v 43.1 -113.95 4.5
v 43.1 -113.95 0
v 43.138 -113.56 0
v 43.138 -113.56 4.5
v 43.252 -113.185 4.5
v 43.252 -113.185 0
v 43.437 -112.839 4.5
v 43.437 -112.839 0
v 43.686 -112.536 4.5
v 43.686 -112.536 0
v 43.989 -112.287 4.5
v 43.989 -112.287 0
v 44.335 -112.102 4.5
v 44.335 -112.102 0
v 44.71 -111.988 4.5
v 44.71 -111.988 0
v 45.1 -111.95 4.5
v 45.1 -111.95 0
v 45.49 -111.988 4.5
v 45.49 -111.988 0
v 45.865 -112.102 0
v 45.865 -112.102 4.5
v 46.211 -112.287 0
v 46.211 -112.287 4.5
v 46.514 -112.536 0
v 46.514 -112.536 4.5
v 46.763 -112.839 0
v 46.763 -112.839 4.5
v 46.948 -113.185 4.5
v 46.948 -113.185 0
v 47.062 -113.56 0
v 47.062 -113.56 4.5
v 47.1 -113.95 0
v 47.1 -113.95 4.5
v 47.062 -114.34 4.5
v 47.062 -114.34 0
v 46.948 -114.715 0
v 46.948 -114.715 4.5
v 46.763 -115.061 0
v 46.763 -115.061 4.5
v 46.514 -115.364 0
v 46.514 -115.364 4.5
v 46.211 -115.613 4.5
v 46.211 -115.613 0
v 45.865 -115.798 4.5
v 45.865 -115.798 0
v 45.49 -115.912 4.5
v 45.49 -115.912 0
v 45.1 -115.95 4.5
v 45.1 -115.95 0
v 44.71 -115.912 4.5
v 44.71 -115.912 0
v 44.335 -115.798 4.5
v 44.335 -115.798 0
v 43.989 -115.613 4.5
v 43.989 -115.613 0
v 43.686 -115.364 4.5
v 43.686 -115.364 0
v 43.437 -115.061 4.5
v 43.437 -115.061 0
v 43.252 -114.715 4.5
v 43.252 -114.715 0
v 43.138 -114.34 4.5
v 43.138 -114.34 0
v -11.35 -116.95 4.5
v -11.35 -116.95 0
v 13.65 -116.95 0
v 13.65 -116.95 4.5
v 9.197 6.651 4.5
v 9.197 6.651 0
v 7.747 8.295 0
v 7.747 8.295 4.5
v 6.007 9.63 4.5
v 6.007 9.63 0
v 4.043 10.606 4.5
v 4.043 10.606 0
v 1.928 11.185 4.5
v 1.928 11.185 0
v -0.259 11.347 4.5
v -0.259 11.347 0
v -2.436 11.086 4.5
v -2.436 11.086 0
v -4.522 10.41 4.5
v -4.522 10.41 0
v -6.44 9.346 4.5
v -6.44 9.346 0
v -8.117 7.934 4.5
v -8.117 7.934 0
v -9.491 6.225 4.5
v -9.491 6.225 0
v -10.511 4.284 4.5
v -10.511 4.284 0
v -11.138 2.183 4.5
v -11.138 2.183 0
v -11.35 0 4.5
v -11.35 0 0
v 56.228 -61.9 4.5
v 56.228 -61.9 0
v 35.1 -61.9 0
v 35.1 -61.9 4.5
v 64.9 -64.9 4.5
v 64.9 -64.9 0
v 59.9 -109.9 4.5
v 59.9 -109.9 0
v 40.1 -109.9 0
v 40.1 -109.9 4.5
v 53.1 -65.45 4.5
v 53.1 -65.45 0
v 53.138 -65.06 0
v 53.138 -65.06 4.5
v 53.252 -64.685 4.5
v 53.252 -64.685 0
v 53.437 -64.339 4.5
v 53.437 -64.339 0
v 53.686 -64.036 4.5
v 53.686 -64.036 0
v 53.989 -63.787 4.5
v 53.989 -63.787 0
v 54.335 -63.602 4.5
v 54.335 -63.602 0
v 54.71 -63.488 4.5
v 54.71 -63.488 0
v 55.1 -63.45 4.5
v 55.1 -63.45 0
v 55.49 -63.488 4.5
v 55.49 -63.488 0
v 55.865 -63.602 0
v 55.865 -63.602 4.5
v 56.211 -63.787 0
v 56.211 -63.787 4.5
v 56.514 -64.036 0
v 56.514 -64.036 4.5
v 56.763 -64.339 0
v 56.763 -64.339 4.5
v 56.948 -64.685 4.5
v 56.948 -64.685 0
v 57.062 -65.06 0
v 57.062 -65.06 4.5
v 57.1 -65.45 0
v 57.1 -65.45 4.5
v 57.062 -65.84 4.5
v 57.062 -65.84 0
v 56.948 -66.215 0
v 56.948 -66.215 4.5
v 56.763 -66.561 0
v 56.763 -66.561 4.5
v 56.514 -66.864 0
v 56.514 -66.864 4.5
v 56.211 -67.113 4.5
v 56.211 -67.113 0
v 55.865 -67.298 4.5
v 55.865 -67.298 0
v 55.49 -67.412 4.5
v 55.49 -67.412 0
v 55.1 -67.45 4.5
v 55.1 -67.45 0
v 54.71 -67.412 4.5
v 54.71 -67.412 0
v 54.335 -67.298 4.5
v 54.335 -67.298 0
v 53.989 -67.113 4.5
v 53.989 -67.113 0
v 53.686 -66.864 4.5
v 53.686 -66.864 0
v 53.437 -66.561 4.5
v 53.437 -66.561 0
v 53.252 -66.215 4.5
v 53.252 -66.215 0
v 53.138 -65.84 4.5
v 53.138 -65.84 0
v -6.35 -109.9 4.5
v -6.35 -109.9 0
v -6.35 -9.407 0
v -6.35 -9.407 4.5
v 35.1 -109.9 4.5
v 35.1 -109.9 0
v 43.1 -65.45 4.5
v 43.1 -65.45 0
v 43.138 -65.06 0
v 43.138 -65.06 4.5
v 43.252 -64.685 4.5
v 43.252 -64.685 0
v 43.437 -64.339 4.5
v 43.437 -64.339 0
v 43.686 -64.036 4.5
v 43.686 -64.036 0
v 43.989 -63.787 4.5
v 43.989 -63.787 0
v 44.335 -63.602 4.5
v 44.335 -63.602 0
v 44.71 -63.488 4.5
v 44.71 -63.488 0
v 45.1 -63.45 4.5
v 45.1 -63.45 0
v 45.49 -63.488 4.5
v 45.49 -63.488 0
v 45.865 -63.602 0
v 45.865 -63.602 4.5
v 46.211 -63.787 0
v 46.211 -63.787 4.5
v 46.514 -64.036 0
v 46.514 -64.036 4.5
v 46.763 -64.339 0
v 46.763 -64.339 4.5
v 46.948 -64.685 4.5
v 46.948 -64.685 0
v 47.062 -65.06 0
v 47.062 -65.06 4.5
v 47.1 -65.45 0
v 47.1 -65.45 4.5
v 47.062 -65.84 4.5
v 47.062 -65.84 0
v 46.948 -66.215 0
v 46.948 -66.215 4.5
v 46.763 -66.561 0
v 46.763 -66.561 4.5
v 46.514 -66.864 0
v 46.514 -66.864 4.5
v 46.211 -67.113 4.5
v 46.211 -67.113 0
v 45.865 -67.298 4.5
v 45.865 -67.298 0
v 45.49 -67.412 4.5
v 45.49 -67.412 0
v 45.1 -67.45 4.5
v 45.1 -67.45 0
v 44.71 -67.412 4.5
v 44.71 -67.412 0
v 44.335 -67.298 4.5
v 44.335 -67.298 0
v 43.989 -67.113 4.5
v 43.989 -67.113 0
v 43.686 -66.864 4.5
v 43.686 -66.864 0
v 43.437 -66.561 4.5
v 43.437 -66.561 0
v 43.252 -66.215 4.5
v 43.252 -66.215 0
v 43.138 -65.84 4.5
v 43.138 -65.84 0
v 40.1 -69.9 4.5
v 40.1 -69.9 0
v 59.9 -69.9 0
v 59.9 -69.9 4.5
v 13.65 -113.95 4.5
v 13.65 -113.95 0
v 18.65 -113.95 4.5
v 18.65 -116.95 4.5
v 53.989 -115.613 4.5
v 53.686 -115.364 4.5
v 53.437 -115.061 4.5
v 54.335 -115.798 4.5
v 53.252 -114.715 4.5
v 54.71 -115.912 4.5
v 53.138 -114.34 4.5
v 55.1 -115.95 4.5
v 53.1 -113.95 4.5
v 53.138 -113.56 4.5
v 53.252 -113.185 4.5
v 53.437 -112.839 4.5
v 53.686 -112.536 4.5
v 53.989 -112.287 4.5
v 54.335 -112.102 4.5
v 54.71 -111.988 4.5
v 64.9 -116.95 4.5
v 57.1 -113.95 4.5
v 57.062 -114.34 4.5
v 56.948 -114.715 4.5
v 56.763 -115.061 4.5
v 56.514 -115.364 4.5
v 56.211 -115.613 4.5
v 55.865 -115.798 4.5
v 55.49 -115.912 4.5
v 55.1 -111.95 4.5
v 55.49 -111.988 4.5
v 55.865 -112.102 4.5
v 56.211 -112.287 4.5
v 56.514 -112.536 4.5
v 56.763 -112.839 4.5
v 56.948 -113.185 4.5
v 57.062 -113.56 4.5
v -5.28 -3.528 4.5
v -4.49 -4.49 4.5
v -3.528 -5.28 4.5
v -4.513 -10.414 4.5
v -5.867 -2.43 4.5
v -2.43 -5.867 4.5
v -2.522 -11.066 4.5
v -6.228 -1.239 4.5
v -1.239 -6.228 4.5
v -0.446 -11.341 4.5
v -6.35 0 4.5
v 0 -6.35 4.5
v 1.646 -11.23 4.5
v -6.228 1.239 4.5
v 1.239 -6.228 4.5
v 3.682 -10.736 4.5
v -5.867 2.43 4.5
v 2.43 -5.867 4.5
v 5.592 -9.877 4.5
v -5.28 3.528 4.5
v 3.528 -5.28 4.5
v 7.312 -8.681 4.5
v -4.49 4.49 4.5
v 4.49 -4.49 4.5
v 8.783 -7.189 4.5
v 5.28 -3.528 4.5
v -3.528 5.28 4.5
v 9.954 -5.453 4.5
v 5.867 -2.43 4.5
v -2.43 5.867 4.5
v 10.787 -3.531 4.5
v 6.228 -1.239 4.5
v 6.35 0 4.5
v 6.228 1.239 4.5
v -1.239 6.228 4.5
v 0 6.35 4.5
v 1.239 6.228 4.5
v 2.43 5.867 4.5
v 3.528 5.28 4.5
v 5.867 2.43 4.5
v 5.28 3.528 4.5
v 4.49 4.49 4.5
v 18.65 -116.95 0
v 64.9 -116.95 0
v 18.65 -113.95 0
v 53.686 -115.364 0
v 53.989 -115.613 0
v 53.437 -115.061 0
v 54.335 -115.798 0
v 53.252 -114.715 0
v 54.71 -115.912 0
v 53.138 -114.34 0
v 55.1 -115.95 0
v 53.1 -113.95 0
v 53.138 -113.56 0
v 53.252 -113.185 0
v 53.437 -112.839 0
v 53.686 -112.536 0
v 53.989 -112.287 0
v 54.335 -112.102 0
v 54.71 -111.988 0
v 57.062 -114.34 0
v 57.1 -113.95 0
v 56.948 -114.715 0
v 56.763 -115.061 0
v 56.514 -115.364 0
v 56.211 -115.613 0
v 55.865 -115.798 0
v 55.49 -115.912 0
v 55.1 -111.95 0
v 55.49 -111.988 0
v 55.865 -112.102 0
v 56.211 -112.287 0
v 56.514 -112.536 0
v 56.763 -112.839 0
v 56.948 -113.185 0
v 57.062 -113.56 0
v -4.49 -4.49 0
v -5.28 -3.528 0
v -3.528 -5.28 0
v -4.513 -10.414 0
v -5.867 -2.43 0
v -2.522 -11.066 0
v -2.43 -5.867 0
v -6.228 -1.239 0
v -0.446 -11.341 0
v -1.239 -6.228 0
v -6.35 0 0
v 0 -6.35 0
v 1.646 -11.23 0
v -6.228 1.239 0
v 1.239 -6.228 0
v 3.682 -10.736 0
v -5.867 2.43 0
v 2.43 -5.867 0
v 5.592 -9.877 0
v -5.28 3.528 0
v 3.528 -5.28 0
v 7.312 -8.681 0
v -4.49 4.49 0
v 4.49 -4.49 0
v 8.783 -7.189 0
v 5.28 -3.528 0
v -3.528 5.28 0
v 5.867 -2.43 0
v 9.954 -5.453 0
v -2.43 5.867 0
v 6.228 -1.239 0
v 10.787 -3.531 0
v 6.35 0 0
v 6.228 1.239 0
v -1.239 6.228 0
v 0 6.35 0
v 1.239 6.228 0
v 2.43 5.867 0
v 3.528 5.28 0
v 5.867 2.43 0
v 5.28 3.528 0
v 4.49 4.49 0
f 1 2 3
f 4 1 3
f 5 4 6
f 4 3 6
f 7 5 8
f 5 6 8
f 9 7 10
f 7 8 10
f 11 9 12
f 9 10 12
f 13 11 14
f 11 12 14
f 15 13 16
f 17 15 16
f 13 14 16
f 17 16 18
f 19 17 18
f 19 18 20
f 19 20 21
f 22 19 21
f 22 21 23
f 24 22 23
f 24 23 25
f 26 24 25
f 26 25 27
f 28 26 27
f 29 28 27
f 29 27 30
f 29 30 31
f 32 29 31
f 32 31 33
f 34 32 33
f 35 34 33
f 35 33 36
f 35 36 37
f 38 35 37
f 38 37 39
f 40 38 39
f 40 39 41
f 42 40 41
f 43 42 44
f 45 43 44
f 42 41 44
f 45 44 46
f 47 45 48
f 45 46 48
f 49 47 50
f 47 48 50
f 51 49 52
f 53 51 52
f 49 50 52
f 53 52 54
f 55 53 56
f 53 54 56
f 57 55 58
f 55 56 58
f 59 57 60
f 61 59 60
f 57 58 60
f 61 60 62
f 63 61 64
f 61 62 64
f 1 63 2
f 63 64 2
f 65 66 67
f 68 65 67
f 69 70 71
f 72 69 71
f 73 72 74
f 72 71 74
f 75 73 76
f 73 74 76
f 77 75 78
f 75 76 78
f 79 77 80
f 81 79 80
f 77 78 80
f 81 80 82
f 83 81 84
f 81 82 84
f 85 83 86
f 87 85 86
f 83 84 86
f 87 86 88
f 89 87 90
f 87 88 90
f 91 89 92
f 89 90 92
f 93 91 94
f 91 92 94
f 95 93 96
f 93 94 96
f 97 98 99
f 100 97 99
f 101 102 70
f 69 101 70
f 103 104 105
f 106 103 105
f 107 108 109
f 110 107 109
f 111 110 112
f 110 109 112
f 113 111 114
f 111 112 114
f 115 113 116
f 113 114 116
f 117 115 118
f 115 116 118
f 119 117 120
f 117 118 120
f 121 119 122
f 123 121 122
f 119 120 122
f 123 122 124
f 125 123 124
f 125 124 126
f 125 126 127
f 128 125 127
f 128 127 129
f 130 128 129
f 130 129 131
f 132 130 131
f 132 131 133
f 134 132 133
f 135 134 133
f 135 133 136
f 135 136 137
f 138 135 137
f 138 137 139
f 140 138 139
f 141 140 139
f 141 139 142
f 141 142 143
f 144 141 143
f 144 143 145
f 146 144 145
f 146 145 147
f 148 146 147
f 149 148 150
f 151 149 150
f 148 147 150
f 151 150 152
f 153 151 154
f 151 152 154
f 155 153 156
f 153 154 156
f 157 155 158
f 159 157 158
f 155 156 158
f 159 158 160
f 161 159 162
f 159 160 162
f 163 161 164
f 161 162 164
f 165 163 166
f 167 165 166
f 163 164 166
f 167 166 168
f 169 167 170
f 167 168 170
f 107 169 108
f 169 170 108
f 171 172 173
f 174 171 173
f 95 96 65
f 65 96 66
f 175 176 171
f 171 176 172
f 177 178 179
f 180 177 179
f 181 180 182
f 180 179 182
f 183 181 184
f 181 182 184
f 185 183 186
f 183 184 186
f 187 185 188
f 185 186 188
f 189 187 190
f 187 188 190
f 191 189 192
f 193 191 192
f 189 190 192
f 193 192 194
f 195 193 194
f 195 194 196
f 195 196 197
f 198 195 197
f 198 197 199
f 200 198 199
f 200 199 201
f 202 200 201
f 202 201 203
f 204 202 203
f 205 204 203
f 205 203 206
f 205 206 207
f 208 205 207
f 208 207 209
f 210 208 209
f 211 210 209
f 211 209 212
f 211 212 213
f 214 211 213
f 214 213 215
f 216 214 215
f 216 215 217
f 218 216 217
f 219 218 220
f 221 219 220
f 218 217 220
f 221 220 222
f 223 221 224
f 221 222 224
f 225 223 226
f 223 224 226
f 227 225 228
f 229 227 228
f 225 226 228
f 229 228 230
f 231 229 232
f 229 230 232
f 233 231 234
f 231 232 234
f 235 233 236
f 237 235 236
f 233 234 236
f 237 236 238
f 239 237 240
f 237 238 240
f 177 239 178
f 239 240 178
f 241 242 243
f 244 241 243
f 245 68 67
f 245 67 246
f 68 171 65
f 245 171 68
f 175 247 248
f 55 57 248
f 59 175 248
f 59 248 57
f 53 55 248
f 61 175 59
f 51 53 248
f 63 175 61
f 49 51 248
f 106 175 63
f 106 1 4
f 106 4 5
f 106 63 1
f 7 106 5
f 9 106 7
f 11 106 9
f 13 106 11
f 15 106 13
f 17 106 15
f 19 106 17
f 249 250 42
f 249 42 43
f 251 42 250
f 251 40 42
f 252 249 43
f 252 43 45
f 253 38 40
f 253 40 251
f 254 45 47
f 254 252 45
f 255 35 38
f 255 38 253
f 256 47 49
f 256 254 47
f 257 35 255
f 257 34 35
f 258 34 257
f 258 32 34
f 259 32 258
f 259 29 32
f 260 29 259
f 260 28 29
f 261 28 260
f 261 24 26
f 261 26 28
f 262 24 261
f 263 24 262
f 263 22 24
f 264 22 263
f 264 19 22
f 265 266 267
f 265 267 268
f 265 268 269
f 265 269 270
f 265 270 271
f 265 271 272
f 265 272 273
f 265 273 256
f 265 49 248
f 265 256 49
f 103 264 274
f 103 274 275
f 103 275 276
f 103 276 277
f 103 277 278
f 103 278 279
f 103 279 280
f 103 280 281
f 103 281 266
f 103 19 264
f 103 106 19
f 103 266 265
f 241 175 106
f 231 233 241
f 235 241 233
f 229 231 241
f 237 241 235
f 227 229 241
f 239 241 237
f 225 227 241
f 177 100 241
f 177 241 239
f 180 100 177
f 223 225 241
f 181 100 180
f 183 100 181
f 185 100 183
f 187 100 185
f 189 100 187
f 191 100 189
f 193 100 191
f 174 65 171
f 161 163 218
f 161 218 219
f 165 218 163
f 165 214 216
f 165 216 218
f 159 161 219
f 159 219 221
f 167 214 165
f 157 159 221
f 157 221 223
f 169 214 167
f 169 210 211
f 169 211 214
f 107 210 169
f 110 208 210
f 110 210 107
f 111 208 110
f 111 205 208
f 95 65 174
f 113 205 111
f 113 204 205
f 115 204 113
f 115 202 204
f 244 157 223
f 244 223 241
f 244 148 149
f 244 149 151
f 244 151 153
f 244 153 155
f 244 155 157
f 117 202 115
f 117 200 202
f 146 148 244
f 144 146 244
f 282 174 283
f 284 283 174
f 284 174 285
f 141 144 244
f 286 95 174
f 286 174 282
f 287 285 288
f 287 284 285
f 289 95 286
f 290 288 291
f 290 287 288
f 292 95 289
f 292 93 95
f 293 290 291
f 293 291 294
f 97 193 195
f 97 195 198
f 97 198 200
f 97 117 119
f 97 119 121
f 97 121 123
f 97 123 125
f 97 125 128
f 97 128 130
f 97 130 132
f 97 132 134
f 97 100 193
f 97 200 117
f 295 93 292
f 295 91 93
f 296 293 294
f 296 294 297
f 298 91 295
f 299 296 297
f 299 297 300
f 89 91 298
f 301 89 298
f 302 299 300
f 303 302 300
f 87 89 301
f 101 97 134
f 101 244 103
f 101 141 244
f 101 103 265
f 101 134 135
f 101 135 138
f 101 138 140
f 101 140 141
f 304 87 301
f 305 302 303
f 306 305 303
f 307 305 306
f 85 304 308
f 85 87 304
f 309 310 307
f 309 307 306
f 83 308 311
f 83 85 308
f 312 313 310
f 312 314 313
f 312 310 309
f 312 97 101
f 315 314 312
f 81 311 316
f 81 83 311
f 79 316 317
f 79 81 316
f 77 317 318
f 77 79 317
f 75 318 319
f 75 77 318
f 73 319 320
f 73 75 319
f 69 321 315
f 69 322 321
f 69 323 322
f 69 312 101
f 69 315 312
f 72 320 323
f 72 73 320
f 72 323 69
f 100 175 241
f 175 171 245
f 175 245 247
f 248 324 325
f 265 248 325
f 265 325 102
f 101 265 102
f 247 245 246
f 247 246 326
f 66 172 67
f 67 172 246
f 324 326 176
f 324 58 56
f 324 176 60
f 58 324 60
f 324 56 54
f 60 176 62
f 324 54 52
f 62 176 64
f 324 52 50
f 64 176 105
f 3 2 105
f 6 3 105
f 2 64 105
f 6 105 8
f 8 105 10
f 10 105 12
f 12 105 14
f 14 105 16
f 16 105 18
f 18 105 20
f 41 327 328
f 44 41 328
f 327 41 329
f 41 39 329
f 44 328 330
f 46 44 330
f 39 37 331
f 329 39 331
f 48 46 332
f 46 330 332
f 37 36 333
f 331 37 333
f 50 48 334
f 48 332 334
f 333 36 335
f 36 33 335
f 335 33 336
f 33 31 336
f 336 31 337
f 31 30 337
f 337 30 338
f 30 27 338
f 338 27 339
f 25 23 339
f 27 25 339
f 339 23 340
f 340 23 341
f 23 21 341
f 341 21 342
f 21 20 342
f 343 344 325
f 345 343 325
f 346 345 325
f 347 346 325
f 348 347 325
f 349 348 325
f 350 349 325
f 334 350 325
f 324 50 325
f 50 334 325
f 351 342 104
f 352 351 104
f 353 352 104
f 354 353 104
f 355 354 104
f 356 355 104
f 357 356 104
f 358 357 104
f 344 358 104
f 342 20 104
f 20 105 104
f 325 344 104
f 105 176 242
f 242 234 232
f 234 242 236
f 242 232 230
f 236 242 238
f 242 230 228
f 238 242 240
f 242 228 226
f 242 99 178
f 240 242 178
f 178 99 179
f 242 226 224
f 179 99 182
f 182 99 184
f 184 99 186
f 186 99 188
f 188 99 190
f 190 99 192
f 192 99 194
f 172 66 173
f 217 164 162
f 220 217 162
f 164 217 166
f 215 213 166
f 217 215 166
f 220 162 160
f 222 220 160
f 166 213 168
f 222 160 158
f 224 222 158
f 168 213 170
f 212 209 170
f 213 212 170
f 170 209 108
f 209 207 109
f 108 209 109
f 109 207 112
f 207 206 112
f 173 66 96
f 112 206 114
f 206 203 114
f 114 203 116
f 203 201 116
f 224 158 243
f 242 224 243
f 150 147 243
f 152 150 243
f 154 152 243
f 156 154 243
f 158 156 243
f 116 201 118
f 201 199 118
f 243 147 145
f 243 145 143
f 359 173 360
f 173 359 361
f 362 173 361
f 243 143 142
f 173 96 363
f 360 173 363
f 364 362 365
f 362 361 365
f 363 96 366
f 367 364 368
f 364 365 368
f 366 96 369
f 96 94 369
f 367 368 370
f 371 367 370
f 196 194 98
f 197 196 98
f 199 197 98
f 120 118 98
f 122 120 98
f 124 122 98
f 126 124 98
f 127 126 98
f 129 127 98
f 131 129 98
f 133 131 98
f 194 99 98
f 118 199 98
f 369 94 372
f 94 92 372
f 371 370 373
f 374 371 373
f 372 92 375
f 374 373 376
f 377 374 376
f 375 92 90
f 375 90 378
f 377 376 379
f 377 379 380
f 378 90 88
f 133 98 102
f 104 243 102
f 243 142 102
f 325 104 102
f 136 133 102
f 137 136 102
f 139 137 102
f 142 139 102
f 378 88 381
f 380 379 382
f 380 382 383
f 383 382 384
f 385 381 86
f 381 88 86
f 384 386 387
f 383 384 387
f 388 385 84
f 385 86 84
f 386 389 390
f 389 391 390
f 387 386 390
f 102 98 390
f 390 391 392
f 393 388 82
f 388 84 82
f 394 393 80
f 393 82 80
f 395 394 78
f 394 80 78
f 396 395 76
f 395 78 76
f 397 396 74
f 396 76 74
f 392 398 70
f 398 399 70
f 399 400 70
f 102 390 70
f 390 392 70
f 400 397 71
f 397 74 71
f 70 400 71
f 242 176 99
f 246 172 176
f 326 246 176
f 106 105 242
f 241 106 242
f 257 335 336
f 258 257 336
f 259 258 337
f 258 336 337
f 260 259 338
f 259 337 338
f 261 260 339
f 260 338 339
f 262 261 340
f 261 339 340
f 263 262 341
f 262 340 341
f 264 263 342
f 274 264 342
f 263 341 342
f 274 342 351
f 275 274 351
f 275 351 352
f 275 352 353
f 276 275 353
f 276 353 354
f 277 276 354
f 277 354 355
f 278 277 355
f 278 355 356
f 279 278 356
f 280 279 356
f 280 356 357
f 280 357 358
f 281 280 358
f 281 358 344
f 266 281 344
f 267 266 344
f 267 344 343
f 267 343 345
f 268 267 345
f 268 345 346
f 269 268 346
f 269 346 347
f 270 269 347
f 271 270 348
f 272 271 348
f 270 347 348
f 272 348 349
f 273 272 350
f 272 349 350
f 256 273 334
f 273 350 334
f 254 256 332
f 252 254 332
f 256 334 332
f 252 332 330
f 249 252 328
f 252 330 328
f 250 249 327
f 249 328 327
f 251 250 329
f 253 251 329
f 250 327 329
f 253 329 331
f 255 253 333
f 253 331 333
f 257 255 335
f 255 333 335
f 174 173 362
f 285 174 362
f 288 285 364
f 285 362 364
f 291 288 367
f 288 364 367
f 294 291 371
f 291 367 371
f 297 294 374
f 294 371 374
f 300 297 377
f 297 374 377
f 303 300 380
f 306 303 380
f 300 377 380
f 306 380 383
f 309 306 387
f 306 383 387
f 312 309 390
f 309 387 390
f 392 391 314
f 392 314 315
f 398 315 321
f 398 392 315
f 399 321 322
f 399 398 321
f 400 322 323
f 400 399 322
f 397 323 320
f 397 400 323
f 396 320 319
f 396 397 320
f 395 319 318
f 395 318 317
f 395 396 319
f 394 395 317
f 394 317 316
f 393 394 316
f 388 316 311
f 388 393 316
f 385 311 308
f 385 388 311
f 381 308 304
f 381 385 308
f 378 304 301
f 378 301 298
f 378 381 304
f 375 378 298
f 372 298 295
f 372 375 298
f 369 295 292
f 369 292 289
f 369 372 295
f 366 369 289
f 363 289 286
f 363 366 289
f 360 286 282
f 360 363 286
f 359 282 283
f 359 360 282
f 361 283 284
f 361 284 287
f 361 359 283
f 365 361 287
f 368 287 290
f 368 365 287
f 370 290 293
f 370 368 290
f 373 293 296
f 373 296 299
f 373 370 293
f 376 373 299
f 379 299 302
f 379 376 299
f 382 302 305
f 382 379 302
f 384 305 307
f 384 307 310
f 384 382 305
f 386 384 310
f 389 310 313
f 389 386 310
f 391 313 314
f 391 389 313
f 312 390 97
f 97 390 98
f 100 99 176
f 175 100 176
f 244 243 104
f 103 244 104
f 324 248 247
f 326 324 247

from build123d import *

# Parameters (mm, degrees)
SKETCH1_R           = 6.35
BOSS_EXTRUDE1_DEPTH = 4.5
SKETCH2_R           = 2
CUT_EXTRUDE1_DEPTH  = 134.826613571
SKETCH3_W           = 5
SKETCH3_H           = 3
CUT_EXTRUDE2_DEPTH  = 134.826613571


with BuildPart() as part:
    # Sketch1 → Boss-Extrude1 (new body)
    with BuildSketch(Plane.XY):
        with BuildLine():
            Line((64.9, -114.9), (64.9, -64.9))
            Line((64.9, -64.9), (9.197116485, 6.650981008))
            ThreePointArc((9.197116485, 6.650981008), (-3.49537036, 10.798374232), (-11.35, 0))
            Line((-11.35, 0), (-11.35, -114.9))
            Line((-11.35, -114.9), (-11.35, -116.95))
            Line((-11.35, -116.95), (35.1, -116.95))
            Line((35.1, -116.95), (64.9, -116.95))
            Line((64.9, -116.95), (64.9, -114.9))
        make_face()
        with BuildLine():
            Line((35.1, -61.9), (35.1, -64.9))
            Line((35.1, -64.9), (35.1, -109.9))
            Line((35.1, -109.9), (-6.35, -109.9))
            Line((-6.35, -109.9), (-6.35, -9.407443861))
            ThreePointArc((-6.35, -9.407443861), (3.681868281, -10.736216557), (10.786933356, -3.530519618))
            Line((10.786933356, -3.530519618), (56.22793669, -61.9))
            Line((56.22793669, -61.9), (35.1, -61.9))
        make_face(mode=Mode.SUBTRACT)
        Polygon((40.1, -69.9), (59.9, -69.9), (59.9, -100), (59.9, -109.9), (50, -109.9), (40.1, -109.9), (40.1, -100), align=None, mode=Mode.SUBTRACT)
        Circle(SKETCH1_R, mode=Mode.SUBTRACT)
    extrude(amount=BOSS_EXTRUDE1_DEPTH)

    # Sketch2 → Cut-Extrude1 (cut, through all)
    with BuildSketch(Plane(origin=(0, 0, 0), x_dir=(-1, 0, 0), z_dir=(0, 0, -1))):
        with Locations((-55.1, -113.95)):
            Circle(SKETCH2_R)
        with Locations((-45.1, -113.95)):
            Circle(SKETCH2_R)
        with Locations((-45.1, -65.45)):
            Circle(SKETCH2_R)
        with Locations((-55.1, -65.45)):
            Circle(SKETCH2_R)
    extrude(amount=-CUT_EXTRUDE1_DEPTH, mode=Mode.SUBTRACT)

    # Sketch3 → Cut-Extrude2 (cut, through all)
    with BuildSketch(Plane.XY.offset(4.5)):
        with Locations((16.15, -115.45)):
            Rectangle(SKETCH3_W, SKETCH3_H)
    extrude(amount=-CUT_EXTRUDE2_DEPTH, mode=Mode.SUBTRACT)


solid = part.part
